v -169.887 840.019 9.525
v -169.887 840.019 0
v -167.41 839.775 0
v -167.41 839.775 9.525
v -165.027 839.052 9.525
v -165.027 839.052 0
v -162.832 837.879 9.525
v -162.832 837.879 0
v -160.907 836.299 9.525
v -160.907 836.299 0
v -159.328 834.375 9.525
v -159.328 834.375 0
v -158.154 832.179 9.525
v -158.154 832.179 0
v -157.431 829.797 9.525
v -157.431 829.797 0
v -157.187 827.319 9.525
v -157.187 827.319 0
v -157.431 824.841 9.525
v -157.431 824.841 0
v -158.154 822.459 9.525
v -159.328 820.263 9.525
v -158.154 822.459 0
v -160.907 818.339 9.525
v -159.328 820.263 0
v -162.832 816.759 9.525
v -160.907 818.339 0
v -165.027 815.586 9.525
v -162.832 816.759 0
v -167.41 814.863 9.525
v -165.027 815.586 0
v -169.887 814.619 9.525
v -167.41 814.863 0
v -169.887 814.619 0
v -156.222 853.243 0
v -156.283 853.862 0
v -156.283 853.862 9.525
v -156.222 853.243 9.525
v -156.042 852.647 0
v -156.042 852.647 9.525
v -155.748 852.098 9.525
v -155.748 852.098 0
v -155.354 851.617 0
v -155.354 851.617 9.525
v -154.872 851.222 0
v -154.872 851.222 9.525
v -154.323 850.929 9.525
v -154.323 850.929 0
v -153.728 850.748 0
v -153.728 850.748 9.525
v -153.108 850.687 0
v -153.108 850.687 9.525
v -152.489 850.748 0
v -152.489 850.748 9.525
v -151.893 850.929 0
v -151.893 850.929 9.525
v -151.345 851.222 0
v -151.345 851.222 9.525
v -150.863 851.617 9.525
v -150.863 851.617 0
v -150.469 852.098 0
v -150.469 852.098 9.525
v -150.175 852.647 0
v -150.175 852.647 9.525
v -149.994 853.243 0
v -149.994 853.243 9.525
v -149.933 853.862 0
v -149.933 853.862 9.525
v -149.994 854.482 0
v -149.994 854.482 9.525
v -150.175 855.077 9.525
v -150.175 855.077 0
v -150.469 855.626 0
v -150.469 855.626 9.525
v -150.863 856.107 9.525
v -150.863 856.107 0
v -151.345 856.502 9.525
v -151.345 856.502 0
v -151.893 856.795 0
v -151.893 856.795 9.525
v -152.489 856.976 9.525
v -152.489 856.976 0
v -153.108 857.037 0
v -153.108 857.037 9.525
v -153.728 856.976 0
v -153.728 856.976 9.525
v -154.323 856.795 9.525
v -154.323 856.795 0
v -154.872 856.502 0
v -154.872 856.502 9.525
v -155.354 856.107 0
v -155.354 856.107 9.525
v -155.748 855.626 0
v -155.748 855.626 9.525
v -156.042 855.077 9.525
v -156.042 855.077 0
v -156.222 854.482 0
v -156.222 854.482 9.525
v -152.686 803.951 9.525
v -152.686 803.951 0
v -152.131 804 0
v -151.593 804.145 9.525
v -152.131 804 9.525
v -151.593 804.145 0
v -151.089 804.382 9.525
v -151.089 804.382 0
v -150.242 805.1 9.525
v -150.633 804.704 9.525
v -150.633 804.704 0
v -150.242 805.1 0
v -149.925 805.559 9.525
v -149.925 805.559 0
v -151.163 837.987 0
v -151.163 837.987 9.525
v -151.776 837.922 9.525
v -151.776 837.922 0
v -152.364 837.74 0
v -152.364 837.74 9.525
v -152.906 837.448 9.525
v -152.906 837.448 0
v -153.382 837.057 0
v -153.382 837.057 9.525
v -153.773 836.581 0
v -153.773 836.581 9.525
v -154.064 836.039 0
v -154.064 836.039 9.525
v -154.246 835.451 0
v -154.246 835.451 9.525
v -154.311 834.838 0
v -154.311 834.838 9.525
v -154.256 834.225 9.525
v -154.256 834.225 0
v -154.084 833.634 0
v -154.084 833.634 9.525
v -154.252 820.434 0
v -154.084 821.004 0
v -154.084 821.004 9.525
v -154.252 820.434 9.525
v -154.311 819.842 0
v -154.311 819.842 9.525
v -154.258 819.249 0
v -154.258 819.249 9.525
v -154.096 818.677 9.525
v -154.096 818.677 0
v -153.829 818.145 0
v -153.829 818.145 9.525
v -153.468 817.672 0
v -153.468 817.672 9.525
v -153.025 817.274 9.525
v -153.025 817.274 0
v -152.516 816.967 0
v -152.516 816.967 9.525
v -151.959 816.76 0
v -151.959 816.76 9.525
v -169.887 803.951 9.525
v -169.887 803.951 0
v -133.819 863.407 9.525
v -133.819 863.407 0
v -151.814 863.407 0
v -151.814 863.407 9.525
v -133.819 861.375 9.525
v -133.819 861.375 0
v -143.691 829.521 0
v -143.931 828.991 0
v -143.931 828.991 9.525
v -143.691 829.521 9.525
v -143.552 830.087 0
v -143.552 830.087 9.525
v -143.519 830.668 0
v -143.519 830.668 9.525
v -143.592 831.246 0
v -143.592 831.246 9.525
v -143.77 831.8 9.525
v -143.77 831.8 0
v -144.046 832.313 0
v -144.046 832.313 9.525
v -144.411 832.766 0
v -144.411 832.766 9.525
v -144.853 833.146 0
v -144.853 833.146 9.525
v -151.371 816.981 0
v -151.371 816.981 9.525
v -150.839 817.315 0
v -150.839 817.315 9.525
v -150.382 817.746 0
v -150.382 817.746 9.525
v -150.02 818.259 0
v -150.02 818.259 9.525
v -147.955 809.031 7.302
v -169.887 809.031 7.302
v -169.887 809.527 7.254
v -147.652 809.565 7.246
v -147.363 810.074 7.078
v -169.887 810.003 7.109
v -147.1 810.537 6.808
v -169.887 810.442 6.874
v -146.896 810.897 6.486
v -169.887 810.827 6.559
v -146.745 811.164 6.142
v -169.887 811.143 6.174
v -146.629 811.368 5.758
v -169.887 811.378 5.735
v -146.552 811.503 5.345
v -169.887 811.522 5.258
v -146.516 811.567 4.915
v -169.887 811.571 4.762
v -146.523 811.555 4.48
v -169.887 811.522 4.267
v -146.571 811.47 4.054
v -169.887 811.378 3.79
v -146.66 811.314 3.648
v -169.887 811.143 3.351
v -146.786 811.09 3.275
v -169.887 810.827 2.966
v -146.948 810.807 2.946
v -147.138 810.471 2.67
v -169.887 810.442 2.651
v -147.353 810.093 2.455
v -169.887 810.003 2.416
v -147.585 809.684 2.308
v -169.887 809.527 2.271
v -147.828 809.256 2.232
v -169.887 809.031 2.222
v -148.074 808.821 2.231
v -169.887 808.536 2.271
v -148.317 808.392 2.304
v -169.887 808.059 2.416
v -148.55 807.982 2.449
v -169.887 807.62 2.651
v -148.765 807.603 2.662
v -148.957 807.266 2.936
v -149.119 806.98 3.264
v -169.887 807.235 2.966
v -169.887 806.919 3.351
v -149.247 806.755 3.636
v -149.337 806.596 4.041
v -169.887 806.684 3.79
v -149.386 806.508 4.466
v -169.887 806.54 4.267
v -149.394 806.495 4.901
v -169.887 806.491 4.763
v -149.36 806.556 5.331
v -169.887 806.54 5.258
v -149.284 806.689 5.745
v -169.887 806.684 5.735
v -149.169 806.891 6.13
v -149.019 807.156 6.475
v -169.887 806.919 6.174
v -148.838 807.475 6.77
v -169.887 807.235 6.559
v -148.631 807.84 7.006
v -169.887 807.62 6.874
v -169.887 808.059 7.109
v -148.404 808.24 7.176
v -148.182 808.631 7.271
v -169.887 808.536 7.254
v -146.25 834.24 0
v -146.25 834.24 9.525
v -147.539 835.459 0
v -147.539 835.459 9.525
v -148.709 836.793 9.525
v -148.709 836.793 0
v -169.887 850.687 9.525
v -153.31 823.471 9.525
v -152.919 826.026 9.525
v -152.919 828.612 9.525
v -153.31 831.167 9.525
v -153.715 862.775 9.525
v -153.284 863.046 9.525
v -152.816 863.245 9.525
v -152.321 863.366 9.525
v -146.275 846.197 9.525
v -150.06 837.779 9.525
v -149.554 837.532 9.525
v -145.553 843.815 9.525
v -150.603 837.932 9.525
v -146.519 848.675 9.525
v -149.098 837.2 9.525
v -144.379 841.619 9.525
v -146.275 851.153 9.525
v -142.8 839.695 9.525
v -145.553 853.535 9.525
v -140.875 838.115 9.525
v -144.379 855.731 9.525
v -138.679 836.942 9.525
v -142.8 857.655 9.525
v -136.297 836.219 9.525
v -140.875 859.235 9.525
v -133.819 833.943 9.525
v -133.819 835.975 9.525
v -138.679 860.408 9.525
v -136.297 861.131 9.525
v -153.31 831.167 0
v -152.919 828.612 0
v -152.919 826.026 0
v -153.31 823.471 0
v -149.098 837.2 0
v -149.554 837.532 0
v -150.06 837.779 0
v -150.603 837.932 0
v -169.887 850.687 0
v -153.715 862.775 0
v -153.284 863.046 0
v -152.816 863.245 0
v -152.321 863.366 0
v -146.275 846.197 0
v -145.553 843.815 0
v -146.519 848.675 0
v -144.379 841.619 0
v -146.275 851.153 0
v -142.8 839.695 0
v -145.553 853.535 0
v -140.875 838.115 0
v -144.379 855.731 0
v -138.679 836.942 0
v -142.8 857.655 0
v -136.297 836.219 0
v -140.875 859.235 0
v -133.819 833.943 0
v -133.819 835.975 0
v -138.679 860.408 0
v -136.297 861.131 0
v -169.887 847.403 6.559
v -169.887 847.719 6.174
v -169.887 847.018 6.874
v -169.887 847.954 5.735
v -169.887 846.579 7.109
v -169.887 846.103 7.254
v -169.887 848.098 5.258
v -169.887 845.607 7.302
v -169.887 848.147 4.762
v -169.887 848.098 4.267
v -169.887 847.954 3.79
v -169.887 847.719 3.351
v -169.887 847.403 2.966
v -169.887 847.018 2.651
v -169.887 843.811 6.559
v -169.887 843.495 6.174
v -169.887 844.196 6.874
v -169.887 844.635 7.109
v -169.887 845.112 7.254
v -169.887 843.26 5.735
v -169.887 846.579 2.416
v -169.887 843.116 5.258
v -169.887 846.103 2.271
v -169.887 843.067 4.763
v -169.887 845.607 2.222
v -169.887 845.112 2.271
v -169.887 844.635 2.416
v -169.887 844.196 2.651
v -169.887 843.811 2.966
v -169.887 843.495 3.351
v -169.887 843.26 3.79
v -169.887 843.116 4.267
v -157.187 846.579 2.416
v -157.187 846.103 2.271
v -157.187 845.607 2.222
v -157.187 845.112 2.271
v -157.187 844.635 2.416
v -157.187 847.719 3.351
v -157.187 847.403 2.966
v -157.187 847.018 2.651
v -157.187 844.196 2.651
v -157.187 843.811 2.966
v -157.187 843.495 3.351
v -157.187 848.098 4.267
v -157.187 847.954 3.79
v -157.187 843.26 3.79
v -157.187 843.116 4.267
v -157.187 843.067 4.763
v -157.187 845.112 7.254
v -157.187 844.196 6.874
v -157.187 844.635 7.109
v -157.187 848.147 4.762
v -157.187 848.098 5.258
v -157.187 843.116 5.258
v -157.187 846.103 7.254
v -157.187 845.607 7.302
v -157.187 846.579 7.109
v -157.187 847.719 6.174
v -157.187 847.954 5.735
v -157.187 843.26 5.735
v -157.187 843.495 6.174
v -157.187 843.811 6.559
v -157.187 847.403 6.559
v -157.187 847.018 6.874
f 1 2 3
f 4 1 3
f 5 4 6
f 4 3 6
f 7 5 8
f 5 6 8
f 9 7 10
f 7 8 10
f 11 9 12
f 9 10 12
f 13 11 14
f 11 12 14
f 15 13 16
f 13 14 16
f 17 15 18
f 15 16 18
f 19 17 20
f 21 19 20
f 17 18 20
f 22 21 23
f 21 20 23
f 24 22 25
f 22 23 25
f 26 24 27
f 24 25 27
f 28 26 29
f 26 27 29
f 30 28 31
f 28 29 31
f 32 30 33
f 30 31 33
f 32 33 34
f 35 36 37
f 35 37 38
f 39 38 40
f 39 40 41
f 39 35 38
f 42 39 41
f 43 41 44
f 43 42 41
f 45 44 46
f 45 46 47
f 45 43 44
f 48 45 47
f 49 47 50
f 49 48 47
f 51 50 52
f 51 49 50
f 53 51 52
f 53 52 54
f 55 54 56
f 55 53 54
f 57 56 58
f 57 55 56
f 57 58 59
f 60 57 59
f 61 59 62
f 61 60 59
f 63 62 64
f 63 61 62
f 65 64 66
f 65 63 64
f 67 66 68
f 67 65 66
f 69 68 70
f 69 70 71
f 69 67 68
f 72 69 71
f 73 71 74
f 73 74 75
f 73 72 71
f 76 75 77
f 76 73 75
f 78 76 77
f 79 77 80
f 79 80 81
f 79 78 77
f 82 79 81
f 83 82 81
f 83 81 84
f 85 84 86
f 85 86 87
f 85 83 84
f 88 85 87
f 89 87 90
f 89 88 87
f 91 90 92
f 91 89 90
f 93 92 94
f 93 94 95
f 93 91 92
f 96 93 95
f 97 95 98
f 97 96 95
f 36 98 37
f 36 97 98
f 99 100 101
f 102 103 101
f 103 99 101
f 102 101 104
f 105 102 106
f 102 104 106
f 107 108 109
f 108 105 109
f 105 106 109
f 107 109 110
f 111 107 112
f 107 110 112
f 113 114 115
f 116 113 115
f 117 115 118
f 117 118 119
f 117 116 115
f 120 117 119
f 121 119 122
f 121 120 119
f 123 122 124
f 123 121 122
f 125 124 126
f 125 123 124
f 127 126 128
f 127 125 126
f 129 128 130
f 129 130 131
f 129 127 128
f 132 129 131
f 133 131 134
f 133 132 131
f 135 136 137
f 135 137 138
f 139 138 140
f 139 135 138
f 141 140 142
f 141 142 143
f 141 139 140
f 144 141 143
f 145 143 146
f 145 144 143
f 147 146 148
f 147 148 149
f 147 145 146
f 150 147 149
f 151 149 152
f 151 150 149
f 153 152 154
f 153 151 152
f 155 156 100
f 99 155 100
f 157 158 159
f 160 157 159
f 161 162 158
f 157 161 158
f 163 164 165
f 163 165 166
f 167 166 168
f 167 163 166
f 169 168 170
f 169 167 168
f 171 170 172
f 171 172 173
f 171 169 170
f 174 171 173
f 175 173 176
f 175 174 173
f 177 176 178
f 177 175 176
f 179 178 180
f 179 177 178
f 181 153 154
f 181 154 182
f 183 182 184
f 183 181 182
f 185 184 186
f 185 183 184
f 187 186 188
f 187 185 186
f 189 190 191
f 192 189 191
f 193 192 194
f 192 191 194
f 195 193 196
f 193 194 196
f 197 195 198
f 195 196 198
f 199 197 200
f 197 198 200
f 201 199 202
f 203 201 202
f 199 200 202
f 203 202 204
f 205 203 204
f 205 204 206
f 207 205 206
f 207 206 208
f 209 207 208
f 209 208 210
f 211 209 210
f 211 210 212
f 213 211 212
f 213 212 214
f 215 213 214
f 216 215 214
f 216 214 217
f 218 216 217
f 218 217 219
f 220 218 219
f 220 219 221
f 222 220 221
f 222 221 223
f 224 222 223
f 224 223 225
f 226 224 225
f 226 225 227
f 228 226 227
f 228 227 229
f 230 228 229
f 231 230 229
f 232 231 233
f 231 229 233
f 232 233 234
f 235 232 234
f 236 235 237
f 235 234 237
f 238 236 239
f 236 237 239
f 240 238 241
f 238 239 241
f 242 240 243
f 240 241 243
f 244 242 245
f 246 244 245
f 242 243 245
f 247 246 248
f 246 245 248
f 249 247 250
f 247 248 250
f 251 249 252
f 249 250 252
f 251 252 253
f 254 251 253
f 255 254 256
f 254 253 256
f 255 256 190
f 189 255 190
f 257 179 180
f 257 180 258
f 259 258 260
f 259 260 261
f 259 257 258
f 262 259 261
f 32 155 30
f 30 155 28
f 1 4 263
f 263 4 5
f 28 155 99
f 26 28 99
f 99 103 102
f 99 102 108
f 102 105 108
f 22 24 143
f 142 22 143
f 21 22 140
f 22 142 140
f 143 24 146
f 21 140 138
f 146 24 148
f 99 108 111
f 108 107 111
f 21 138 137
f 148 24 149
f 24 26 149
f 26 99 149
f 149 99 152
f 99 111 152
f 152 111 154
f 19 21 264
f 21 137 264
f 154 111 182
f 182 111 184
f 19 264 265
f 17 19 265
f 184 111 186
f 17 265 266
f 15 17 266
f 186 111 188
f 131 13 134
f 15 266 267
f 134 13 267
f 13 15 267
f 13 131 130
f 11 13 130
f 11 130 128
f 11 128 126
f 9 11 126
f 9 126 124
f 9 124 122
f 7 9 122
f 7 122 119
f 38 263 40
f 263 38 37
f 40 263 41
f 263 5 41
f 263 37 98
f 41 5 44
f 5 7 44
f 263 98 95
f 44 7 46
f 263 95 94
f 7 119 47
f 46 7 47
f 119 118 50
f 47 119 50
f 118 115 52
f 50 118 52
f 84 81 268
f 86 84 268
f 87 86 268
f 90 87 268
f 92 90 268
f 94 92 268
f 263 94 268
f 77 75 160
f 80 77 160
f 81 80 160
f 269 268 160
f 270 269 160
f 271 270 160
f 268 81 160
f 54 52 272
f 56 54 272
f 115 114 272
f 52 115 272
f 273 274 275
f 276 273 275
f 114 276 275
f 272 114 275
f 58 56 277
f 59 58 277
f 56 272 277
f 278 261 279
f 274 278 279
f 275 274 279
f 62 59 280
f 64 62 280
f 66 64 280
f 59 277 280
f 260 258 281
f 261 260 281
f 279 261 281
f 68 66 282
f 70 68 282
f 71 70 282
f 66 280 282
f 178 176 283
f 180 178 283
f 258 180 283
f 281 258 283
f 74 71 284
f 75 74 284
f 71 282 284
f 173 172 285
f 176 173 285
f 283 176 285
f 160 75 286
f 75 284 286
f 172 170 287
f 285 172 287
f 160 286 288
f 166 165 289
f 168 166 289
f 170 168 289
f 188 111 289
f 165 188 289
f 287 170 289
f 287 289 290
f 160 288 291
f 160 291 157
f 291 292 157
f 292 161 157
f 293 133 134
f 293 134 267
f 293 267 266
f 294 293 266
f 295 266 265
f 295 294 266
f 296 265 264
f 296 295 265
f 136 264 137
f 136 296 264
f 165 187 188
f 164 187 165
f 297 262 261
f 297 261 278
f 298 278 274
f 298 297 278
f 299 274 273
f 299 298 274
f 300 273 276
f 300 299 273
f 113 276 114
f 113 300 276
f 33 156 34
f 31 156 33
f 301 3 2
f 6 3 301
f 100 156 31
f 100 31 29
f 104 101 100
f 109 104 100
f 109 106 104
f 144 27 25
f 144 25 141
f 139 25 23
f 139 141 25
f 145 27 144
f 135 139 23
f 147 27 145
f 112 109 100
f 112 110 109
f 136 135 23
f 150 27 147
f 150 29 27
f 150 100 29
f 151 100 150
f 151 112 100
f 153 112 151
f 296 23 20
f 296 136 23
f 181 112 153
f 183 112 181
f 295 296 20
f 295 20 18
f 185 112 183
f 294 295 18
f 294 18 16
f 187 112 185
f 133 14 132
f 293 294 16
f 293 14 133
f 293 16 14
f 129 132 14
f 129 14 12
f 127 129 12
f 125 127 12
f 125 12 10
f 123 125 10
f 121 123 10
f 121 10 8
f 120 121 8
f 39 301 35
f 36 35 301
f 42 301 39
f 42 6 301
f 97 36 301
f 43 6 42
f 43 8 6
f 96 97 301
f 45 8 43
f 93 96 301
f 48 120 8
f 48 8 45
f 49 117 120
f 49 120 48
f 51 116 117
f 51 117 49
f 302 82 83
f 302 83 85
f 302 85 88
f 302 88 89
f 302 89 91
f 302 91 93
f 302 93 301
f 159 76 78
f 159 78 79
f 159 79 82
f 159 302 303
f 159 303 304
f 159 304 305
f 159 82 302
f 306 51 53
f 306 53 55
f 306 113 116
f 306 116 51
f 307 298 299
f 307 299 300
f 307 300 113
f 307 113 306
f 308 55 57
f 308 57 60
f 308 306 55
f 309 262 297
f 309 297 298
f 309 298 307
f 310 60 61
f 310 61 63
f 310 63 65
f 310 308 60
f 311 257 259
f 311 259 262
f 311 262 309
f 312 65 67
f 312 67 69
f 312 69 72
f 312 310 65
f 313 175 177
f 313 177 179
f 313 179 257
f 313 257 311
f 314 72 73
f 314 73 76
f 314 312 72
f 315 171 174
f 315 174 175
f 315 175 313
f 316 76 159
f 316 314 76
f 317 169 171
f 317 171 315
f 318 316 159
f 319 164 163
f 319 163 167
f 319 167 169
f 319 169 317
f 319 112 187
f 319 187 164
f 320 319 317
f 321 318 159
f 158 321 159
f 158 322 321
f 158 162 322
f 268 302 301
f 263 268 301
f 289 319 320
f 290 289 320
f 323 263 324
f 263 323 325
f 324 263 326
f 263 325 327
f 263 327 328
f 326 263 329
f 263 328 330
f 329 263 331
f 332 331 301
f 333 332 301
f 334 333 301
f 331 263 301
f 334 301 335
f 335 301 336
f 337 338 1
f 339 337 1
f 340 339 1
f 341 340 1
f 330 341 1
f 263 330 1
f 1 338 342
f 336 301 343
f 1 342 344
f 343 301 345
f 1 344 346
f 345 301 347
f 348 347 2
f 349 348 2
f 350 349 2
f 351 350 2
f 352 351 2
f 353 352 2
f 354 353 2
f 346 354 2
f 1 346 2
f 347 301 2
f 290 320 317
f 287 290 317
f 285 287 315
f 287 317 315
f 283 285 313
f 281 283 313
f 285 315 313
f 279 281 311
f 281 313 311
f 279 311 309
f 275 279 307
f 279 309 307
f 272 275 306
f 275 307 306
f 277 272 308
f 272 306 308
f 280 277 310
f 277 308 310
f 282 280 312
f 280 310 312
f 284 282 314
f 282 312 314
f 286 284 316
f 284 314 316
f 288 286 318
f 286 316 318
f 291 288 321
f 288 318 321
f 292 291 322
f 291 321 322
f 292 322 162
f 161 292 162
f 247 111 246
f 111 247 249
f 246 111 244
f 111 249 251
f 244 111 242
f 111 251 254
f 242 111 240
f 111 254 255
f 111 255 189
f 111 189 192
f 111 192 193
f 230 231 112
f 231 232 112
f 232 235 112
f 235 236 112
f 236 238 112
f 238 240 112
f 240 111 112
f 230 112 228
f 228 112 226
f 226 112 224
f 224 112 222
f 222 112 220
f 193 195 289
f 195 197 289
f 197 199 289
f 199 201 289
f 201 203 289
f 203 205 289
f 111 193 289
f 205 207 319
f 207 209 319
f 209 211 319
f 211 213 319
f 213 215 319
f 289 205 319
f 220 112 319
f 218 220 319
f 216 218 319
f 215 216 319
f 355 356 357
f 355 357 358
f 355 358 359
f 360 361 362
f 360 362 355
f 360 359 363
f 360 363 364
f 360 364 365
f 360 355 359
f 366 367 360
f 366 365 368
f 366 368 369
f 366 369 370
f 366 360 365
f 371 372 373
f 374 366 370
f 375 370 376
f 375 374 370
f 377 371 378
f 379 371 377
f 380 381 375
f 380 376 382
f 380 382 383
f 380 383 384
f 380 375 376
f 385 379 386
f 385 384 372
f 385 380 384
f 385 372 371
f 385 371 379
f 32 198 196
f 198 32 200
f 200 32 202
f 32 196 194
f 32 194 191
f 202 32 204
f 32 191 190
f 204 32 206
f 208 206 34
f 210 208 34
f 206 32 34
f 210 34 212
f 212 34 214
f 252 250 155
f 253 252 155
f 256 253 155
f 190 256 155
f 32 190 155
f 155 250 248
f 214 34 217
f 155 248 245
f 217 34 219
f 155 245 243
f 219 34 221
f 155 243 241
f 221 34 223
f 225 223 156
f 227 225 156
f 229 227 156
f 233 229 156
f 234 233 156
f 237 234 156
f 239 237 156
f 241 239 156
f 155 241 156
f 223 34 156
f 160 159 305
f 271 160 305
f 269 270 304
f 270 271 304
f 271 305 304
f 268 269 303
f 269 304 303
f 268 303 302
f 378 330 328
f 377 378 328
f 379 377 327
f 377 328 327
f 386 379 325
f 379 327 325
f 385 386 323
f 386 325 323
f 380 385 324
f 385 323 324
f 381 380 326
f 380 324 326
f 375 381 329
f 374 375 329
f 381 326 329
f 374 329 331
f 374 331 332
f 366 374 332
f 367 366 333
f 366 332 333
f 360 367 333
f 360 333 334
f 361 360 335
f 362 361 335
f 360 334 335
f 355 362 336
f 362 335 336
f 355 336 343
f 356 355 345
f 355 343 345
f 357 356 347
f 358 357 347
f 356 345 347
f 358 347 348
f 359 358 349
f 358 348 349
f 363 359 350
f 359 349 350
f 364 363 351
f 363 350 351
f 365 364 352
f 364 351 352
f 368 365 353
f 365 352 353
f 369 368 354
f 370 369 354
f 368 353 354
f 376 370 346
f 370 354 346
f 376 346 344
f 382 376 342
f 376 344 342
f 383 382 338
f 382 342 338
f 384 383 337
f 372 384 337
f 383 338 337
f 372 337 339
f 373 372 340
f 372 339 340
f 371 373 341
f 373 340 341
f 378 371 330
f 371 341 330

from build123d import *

# Parameters (mm, degrees)
SKETCH1_R           = 3.175
BOSS_EXTRUDE1_DEPTH = 9.525
SKETCH3_R           = 2.54
CUT_EXTRUDE1_DEPTH  = 12.7
CUT_EXTRUDE2_REACH  = 865.776
SKETCH4_R           = 2.54
FILLET1_R           = 3.175
SKETCH5_R           = 12.7
CUT_EXTRUDE3_DEPTH  = 881.013791313


with BuildPart() as part:
    # Sketch1 → Boss-Extrude1 (new body)
    with BuildSketch(Plane.XY):
        with BuildLine():
            Line((-169.8874175, 850.687119625), (-169.8874175, 837.987119625))
            ThreePointArc((-169.8874175, 837.987119625), (-159.2194175, 827.319119625), (-169.8874175, 816.651119625))
            Line((-169.8874175, 816.651119625), (-169.8874175, 803.951119625))
            Line((-169.8874175, 803.951119625), (-150.8374175, 803.951119625))
            Line((-150.8374175, 803.951119625), (-133.8194175, 833.943095553))
            Line((-133.8194175, 833.943095553), (-133.8194175, 835.975095553))
            ThreePointArc((-133.8194175, 835.975095553), (-146.5194175, 848.675095553), (-133.8194175, 861.375095553))
            Line((-133.8194175, 861.375095553), (-133.8194175, 863.407095553))
            Line((-133.8194175, 863.407095553), (-152.8694175, 863.407095553))
            Line((-152.8694175, 863.407095553), (-169.8874175, 850.687119625))
        make_face()
        with Locations(Location((-153.108454604, 853.862119625, 0), (0, 0, 180))):
            Circle(SKETCH1_R, mode=Mode.SUBTRACT)
        with BuildLine():
            Line((-150.93222253, 816.651119625), (-142.409287823, 831.671665669))
            ThreePointArc((-142.409287823, 831.671665669), (-146.401670459, 834.371620085), (-149.588680975, 837.987119625))
            Line((-149.588680975, 837.987119625), (-156.628228233, 837.987119625))
            ThreePointArc((-156.628228233, 837.987119625), (-152.8694175, 827.319119625), (-156.628228233, 816.651119625))
            Line((-156.628228233, 816.651119625), (-150.93222253, 816.651119625))
        make_face(mode=Mode.SUBTRACT)
    extrude(amount=BOSS_EXTRUDE1_DEPTH)

    # Sketch3 → Cut-Extrude1 (cut)
    with BuildSketch(Plane.ZY.offset(169.8874175)):
        with Locations((4.7625, 845.607119625)):
            Circle(SKETCH3_R)
        with Locations((4.7625, 809.031119625)):
            Circle(SKETCH3_R)
    extrude(amount=-CUT_EXTRUDE1_DEPTH, mode=Mode.SUBTRACT)

    # Sketch4 → Cut-Extrude2 (cut, up to next)
    with BuildSketch(Plane.ZY.offset(157.1874175), mode=Mode.PRIVATE) as cut_extrude2_sk1:
        with Locations((4.7625, 809.031119625)):
            Circle(SKETCH4_R)
    cut_extrude2_tool1 = extrude(cut_extrude2_sk1.sketch, amount=-CUT_EXTRUDE2_REACH, mode=Mode.PRIVATE) & part.part
    add(cut_extrude2_tool1.solids().sort_by_distance((-157.187417, 809.03112, 4.7625))[0], mode=Mode.SUBTRACT)

    # Fillet1
    # the kernel refuses this fillet: 3.175 mm, written as the material it adds along each edge
    with BuildSketch(Plane(origin=(-150.93222253, 816.651119625, 0), x_dir=(0.4935074111606293, 0.8697415910082337, 0), z_dir=(0, 0, 1))) as fillet1_piece_1:
        with BuildLine():
            CenterArc((FILLET1_R * 0.582348359646, FILLET1_R), FILLET1_R, 209.571375415, 60.428624585)
            Line((-FILLET1_R * 0.287393231362, FILLET1_R * 0.506492588839), (0, 0))
            Line((0, 0), (FILLET1_R * 0.582348359646, 0))
        make_face()
    extrude(amount=9.525)
    with BuildSketch(Plane(origin=(-149.588680975, 837.987119625, 0), x_dir=(0.5928517761937993, -0.8053115989875331, 0), z_dir=(0, 0, 1))) as fillet1_piece_2:
        with BuildLine():
            CenterArc((1.606983899, -3.172592716), FILLET1_R, 92.231294299, 51.409064566)
            Line((-0.949880428, -1.290288327), (0, 0))
            ThreePointArc((0, 0), (0.741684876, -0.014443703), (1.483369753, 0))
        make_face()
    extrude(amount=9.525)
    with BuildSketch(Plane(origin=(-156.628228233, 837.987119625, 0), x_dir=(1, 0, 0), z_dir=(0, 0, 1))) as fillet1_piece_3:
        with BuildLine():
            CenterArc((5.49213602, -3.175), FILLET1_R, 90, 111.781571646)
            ThreePointArc((2.543814434, -4.353144654), (1.434014336, -2.081843008), (0, 0))
            Line((0, 0), (5.49213602, 0))
        make_face()
    extrude(amount=9.525)
    with BuildSketch(Plane(origin=(-156.628228233, 816.651119625, 0), x_dir=(0.5045338460547648, 0.8633919145933595, 0), z_dir=(0, 0, 1))) as fillet1_piece_4:
        with BuildLine():
            CenterArc((5.512237838, -3.139970872), FILLET1_R, 98.518841269, 111.781571646)
            Line((2.770968509, -4.741865834), (0, 0))
            ThreePointArc((0, 0), (2.520955189, -0.187756124), (5.041910378, 0))
        make_face()
    extrude(amount=9.525)
    with BuildSketch(Plane(origin=(-142.409287823, 831.671665669, 0), x_dir=(-0.49350741116063396, -0.869741591008231, 0), z_dir=(0, 0, 1))) as fillet1_piece_5:
        with BuildLine():
            CenterArc((3.082586278, -3.175), FILLET1_R, 90, 84.177526613)
            ThreePointArc((-0.07603388, -2.852907312), (0.015483213, -1.427879508), (0, 0))
            Line((0, 0), (3.082586278, 0))
        make_face()
    extrude(amount=9.525)
    # the kernel refuses this fillet: 3.175 mm, written as the material it takes off along each edge
    with BuildSketch(Plane(origin=(-152.8694175, 863.407095553, -2.638608517), x_dir=(-0.80098222360548, -0.5986881303884525, 0), z_dir=(0, 0, 1))) as fillet1_2_piece_1:
        with BuildLine():
            CenterArc((FILLET1_R * 0.332423120307, FILLET1_R), FILLET1_R, 233.22400043, 36.77599957)
            Line((-FILLET1_R * 0.266265010081, FILLET1_R * 0.199017776395), (0, 0))
            Line((0, 0), (FILLET1_R * 0.332423120307, 0))
        make_face()
    extrude(amount=14.802217035, mode=Mode.SUBTRACT)
    with BuildSketch(Plane(origin=(-150.8374175, 803.951119625, -4.622390105), x_dir=(-1, 0, 0), z_dir=(0, 0, 1))) as fillet1_2_piece_2:
        with BuildLine():
            CenterArc((FILLET1_R * 0.582348359646, -FILLET1_R), FILLET1_R, 90, 60.428624585)
            Line((-FILLET1_R * 0.287393231362, -FILLET1_R * 0.506492588839), (0, 0))
            Line((0, 0), (FILLET1_R * 0.582348359646, 0))
        make_face()
    extrude(amount=18.769780209, mode=Mode.SUBTRACT)

    # Sketch5 → Cut-Extrude3 (cut, through all)
    with BuildSketch(Plane(origin=(0, 0, 0), x_dir=(-1, 0, 0), z_dir=(0, 0, -1))):
        with Locations((169.8874175, 827.319119625)):
            Circle(SKETCH5_R)
    extrude(amount=-CUT_EXTRUDE3_DEPTH, mode=Mode.SUBTRACT)


solid = part.part
